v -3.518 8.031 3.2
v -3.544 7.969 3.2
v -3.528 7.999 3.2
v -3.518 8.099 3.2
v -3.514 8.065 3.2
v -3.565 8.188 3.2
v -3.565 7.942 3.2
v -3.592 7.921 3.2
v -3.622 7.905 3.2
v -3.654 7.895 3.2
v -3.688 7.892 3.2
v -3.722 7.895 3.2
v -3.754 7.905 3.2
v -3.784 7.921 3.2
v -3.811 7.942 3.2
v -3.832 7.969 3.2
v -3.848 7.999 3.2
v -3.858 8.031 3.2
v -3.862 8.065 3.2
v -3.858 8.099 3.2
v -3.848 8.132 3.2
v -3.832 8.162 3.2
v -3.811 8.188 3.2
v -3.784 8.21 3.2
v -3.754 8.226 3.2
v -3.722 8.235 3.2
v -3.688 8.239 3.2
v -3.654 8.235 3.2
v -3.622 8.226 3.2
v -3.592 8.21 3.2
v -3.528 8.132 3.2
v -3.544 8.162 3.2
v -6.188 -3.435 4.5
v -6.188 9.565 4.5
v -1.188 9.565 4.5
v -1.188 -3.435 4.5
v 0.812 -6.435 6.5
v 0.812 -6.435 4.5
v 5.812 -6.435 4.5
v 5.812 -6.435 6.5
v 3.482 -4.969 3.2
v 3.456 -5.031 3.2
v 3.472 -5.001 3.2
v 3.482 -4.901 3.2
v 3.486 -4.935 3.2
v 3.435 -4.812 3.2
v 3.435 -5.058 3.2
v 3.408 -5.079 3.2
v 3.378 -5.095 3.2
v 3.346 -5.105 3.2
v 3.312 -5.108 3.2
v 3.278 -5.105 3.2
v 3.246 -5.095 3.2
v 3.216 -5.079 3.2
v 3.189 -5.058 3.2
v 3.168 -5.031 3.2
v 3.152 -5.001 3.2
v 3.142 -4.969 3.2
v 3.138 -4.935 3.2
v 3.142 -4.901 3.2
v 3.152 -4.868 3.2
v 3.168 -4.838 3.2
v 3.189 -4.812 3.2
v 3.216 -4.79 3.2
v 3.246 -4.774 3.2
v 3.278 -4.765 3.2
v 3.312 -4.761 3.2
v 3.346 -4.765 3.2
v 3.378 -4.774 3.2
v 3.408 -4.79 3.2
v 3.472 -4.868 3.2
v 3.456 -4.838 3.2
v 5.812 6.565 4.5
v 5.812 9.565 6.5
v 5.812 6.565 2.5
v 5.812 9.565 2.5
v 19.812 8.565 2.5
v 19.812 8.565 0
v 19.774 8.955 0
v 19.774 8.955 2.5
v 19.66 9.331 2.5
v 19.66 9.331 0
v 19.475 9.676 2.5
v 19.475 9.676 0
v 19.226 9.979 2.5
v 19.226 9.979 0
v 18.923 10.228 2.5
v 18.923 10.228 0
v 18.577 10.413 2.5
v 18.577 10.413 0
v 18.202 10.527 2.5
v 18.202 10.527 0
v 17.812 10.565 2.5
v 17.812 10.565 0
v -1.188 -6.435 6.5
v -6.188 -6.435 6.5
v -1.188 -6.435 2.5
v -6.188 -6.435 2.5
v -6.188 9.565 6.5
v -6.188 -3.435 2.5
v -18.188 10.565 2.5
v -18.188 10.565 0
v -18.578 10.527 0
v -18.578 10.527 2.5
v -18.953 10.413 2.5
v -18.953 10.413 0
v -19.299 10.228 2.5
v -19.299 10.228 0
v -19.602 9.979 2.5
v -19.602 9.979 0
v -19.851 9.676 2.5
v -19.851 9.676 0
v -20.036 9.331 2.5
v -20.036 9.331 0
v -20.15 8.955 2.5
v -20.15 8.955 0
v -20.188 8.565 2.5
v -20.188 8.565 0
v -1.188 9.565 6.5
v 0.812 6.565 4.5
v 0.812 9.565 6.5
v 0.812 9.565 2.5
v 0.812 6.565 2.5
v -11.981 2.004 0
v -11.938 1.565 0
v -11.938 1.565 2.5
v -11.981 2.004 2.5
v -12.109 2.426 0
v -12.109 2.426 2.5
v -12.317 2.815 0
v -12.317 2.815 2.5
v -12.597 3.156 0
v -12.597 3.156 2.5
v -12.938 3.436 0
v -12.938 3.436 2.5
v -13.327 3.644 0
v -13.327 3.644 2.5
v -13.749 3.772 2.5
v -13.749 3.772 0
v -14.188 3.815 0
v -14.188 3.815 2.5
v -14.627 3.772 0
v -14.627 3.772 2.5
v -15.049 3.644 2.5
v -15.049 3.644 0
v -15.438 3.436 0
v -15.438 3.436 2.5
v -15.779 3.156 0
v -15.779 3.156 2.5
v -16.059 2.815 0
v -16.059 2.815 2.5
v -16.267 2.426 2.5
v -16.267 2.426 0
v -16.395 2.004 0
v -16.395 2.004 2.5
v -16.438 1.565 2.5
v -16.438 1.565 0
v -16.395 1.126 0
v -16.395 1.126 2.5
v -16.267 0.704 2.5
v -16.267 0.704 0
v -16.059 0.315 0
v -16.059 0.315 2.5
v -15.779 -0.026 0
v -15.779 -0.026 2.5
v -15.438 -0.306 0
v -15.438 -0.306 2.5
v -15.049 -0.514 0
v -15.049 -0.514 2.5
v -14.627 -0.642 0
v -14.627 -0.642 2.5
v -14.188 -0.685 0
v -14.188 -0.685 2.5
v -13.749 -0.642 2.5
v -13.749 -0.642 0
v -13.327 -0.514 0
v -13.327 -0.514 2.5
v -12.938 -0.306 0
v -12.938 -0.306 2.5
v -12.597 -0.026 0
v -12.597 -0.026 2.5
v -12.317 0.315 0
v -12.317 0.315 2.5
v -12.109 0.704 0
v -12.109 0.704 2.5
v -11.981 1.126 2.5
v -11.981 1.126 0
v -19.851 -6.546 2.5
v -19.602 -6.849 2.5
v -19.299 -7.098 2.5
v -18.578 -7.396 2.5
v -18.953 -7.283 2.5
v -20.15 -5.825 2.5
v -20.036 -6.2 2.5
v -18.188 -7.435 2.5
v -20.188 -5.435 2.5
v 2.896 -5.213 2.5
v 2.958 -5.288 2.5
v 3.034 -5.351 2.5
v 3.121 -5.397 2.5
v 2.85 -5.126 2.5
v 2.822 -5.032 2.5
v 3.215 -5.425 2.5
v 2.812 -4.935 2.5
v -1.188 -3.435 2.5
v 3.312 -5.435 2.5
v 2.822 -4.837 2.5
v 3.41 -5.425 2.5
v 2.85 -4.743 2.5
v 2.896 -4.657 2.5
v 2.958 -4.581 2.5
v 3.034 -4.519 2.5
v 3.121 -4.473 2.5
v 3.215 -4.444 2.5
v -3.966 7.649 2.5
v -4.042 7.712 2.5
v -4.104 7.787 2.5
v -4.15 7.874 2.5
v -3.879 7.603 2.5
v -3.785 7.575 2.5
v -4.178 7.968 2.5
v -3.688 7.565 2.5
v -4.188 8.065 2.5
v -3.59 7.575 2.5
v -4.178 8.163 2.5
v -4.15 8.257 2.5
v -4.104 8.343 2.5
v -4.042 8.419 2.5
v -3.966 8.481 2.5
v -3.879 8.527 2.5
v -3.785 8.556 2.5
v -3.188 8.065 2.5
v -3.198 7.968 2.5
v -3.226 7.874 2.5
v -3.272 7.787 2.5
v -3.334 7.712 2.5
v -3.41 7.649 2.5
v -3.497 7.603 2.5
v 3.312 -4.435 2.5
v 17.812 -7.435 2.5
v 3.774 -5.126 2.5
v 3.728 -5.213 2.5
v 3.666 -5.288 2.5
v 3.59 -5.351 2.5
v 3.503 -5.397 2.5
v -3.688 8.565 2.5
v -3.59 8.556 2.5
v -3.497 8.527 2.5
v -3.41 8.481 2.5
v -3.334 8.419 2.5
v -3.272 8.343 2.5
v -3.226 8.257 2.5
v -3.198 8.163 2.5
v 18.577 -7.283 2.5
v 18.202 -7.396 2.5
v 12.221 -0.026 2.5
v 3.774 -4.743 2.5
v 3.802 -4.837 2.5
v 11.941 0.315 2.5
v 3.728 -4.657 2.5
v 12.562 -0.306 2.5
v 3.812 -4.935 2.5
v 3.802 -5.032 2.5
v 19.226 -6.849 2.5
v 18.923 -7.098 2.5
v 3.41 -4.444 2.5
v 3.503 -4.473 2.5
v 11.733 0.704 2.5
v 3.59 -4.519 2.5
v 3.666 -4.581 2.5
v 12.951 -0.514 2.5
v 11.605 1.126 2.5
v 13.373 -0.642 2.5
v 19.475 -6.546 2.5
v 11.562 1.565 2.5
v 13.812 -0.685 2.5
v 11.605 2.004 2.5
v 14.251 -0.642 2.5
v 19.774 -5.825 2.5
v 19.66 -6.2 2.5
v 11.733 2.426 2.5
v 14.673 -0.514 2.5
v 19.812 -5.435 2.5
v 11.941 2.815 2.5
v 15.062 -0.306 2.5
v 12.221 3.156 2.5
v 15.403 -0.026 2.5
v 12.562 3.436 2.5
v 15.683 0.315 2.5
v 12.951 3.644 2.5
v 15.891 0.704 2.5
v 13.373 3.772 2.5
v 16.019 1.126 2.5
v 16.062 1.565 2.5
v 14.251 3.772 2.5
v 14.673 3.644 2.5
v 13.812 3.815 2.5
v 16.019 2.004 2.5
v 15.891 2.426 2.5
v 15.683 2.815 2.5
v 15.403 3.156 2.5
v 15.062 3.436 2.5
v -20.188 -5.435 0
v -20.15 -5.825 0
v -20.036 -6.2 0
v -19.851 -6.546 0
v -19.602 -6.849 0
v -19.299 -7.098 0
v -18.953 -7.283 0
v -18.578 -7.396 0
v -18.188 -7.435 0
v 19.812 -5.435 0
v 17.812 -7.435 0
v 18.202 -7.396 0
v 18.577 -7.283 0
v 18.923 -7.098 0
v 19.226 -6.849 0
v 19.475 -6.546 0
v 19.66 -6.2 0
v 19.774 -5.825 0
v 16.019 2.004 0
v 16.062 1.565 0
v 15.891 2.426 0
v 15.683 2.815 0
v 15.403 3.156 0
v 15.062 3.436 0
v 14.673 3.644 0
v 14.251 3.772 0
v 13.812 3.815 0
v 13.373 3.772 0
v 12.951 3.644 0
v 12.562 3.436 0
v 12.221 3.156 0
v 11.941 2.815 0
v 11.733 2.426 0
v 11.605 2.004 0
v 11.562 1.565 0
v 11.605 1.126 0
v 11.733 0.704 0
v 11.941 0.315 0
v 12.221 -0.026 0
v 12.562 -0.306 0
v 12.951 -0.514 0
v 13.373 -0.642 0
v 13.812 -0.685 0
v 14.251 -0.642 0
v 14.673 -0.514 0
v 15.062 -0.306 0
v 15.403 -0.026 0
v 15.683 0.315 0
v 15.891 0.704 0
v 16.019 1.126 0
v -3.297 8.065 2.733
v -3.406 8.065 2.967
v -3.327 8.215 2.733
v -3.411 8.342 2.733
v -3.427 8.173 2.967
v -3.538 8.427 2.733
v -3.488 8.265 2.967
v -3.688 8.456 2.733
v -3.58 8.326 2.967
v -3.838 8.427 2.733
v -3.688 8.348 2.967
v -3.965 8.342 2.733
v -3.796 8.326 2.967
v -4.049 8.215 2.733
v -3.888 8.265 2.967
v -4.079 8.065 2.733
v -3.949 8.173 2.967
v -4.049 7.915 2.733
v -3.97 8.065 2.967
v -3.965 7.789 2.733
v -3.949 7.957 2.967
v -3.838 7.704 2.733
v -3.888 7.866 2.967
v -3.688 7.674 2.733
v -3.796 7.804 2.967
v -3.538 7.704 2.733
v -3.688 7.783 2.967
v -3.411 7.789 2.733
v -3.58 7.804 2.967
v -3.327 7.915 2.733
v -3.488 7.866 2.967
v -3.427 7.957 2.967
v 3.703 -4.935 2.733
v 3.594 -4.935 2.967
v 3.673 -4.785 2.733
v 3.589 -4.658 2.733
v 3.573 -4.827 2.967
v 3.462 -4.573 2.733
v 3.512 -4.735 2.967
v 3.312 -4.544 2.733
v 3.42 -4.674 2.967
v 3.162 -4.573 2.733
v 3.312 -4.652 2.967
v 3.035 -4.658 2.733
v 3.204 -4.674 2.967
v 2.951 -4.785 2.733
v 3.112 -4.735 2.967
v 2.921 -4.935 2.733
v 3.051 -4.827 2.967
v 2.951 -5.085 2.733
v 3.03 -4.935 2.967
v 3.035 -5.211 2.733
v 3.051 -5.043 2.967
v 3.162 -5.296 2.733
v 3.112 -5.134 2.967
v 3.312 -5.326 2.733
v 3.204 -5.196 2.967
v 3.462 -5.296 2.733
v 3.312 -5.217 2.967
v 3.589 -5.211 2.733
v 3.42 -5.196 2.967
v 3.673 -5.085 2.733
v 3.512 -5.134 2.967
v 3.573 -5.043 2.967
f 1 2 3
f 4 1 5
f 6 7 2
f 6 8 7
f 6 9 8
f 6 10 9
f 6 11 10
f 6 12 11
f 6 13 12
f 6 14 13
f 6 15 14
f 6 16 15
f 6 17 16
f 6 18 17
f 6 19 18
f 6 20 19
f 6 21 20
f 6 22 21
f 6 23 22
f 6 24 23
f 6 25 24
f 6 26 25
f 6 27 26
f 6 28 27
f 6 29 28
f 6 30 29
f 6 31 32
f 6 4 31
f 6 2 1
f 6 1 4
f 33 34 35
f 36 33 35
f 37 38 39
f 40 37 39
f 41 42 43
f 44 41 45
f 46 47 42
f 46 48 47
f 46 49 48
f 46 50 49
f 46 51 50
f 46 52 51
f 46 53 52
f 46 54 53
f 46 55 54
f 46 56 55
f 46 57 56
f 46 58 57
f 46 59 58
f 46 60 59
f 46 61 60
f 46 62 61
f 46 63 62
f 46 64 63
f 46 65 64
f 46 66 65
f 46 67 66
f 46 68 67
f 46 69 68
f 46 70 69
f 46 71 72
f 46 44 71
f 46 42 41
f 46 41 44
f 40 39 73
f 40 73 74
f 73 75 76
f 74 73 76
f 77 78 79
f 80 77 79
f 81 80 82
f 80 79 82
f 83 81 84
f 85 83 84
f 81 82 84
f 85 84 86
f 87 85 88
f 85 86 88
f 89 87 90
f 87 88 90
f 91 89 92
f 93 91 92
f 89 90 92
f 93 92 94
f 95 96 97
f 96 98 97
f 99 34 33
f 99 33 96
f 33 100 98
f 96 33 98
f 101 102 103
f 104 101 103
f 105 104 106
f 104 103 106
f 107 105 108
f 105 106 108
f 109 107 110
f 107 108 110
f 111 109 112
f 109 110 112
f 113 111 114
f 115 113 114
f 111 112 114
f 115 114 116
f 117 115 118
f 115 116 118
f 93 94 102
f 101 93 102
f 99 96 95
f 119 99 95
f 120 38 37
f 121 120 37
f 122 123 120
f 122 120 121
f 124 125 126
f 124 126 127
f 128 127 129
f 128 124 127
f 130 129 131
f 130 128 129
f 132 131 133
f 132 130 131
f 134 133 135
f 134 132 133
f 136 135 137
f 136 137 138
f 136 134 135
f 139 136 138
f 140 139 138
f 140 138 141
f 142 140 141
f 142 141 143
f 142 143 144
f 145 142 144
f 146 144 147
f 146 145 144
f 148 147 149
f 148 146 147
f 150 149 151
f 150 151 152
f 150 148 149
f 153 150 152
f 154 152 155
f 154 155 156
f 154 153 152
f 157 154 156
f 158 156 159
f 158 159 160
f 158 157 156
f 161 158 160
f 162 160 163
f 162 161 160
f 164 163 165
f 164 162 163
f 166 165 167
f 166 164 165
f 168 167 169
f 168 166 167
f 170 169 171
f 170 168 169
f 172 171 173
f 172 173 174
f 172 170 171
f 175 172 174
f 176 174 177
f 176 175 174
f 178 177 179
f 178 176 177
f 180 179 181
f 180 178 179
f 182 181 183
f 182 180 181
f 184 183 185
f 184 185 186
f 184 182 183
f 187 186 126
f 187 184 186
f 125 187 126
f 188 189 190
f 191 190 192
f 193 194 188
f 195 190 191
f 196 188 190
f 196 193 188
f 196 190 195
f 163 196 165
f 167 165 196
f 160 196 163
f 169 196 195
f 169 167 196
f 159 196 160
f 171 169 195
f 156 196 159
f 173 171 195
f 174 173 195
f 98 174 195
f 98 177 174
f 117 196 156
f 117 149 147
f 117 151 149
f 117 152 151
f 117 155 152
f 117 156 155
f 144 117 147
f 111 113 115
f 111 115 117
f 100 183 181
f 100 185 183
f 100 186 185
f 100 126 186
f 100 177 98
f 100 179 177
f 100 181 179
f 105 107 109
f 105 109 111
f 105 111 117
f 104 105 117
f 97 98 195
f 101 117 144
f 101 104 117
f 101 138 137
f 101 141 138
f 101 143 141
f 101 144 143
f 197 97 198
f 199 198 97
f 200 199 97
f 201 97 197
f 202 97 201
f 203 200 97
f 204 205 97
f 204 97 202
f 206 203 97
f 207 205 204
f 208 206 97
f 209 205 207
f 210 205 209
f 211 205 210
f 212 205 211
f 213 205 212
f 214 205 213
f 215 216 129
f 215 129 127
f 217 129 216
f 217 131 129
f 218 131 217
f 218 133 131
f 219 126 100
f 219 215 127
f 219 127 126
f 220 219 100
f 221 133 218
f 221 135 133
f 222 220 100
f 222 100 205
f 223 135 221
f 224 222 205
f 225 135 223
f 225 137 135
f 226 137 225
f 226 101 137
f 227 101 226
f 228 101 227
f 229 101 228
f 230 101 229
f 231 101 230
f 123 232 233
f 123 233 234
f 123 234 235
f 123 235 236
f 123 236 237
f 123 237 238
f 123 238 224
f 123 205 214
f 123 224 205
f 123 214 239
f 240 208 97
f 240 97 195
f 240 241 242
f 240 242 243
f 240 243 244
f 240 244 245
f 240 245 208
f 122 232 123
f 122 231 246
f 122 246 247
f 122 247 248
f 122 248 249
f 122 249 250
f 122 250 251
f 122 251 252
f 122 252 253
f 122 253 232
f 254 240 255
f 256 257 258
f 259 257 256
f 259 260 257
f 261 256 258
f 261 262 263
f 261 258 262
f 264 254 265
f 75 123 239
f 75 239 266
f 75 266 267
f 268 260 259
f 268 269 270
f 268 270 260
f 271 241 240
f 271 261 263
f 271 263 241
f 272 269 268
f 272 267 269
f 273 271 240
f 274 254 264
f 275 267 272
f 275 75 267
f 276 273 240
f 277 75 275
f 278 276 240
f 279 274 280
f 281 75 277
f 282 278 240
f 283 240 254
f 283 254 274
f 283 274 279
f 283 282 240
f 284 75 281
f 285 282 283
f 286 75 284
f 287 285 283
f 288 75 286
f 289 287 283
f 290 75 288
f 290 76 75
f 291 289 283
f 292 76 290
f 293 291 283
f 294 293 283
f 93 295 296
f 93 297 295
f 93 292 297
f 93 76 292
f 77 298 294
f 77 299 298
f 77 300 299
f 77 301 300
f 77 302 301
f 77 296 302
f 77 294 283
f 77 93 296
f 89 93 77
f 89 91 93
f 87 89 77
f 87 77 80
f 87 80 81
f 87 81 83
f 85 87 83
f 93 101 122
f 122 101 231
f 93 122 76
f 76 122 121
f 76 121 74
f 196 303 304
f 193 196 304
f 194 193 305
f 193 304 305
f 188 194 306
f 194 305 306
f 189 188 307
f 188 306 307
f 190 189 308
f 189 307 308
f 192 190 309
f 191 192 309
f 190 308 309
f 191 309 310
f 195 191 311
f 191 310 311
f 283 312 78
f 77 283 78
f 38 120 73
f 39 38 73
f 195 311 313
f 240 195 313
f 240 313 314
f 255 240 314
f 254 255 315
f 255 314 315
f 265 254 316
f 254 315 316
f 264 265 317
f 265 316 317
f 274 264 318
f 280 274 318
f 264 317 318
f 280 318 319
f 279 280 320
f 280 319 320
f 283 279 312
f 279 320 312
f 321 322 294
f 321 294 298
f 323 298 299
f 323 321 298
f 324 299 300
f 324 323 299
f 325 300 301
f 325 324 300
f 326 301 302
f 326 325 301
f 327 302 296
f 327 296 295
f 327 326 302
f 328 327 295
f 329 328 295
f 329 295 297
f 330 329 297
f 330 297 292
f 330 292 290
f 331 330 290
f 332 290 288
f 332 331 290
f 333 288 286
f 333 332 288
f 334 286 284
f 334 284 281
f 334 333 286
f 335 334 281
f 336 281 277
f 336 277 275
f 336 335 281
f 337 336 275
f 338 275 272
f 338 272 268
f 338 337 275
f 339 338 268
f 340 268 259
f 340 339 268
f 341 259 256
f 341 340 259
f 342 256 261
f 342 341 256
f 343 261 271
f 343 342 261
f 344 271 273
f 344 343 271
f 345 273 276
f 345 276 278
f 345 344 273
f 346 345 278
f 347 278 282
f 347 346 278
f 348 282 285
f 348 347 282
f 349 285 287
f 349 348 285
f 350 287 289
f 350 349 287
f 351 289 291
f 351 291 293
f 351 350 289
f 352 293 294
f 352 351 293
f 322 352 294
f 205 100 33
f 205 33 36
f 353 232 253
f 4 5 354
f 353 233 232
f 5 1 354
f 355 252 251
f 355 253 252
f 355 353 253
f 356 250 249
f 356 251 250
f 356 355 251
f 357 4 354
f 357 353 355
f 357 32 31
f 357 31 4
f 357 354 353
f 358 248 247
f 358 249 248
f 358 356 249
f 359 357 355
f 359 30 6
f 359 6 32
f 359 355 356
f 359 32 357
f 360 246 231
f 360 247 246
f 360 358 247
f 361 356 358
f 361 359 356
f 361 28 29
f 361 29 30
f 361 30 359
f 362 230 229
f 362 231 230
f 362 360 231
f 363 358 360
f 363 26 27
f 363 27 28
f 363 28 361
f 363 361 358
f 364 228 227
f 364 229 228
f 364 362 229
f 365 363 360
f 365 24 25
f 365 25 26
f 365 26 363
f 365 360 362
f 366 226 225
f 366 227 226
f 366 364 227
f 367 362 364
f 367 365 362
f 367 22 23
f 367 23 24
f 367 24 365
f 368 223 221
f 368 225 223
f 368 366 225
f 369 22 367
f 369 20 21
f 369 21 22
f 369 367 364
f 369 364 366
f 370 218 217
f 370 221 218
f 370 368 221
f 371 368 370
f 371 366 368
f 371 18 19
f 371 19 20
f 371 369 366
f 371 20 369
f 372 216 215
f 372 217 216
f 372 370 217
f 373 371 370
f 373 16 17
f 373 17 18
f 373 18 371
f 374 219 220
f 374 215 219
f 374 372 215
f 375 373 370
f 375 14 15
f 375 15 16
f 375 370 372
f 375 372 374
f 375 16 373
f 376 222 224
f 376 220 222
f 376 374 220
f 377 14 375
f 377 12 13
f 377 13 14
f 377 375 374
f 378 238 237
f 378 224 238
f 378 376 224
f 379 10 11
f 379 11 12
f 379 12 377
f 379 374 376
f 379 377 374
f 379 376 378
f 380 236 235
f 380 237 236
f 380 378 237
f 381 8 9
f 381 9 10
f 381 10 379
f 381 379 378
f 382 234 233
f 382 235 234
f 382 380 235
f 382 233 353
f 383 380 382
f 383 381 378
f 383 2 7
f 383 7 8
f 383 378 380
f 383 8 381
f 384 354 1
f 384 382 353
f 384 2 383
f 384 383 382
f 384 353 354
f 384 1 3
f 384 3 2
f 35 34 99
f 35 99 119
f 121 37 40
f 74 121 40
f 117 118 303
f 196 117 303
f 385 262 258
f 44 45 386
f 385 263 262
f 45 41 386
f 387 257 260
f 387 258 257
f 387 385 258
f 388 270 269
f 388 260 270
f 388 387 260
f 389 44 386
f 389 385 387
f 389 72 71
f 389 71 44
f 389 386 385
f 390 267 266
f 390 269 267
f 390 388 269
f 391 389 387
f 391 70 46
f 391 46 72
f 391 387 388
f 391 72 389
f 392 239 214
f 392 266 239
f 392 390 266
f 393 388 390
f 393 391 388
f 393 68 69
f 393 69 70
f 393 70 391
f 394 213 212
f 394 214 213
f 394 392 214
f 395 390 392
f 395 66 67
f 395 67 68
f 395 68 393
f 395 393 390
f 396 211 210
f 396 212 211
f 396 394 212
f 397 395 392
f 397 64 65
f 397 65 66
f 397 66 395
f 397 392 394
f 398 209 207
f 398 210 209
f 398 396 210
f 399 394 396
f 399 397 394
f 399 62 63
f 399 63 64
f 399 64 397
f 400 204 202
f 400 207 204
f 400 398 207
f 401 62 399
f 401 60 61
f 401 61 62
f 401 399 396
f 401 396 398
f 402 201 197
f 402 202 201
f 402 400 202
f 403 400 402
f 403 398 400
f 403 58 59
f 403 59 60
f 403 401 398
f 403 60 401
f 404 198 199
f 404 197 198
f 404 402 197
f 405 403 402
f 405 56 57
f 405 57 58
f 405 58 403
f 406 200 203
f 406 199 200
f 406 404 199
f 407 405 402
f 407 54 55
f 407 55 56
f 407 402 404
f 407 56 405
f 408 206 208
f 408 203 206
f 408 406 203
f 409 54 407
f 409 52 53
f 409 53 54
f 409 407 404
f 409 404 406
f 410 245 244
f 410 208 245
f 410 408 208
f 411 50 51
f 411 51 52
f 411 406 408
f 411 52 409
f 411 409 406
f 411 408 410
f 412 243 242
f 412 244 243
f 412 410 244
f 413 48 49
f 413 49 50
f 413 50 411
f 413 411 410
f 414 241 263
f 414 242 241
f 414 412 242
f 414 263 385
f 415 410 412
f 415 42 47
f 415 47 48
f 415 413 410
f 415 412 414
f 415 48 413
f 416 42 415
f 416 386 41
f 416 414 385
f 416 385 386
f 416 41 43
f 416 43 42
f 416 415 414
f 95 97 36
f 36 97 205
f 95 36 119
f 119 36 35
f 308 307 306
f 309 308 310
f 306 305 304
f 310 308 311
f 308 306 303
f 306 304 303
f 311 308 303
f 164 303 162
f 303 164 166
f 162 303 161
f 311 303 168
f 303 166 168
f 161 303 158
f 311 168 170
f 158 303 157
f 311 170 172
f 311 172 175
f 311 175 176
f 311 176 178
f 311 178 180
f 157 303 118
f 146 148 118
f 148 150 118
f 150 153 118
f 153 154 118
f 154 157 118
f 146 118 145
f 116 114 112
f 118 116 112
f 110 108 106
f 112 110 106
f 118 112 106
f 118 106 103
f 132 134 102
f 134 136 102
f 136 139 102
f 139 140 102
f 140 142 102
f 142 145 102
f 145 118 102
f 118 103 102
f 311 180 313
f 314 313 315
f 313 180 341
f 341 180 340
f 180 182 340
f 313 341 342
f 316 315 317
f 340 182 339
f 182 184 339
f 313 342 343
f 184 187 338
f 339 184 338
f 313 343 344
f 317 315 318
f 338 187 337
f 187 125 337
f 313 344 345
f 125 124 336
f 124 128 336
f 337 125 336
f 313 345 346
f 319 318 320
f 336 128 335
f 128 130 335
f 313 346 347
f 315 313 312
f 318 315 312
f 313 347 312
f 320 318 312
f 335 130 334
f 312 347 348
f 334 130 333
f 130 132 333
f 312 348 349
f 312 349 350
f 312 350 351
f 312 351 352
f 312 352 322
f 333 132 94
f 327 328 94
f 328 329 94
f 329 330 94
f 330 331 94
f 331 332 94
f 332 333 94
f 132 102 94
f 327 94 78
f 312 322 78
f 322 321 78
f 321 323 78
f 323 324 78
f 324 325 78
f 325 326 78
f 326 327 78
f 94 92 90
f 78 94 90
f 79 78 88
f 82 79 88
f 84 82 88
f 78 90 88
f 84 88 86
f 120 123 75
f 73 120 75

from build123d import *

# Parameters (mm, degrees)
F0_R     = 2.25
F1_DEPTH = 2.5
F2_W     = 5
F2_H     = 3
F3_DEPTH = 2
F4_W     = 5
F4_H     = 13
F4_H_2   = 16
F4_H_3   = 3
F5_DEPTH = 2
F2_R     = 0.5
F6_DEPTH = 0.7
F6_TAPER = 25


with BuildPart() as f1:
    # F0 (on Top) → F1 (new body)
    with BuildSketch(Plane.XY):
        with BuildLine():
            Line((17.8120516539, 10.5652021154), (-18.1879483461, 10.5652021154))
            ThreePointArc((-18.1879483461, 10.5652021154), (-19.6021619085, 9.9794156778), (-20.1879483461, 8.5652021154))
            Line((-20.1879483461, 8.5652021154), (-20.1879483461, -5.4347978846))
            ThreePointArc((-20.1879483461, -5.4347978846), (-19.6021619085, -6.849011447), (-18.1879483461, -7.4347978846))
            Line((-18.1879483461, -7.4347978846), (17.8120516539, -7.4347978846))
            ThreePointArc((17.8120516539, -7.4347978846), (19.2262652162, -6.849011447), (19.8120516539, -5.4347978846))
            Line((19.8120516539, -5.4347978846), (19.8120516539, 8.5652021154))
            ThreePointArc((19.8120516539, 8.5652021154), (19.2262652162, 9.9794156778), (17.8120516539, 10.5652021154))
        make_face()
        with Locations((-14.1879483461, 1.5652021154)):
            Circle(F0_R, mode=Mode.SUBTRACT)
        with Locations((13.8120516539, 1.5652021154)):
            Circle(F0_R, mode=Mode.SUBTRACT)
    extrude(amount=F1_DEPTH)

    # F2 (on face) → F3 (join)
    with BuildSketch(Plane.XY.offset(2.5)):
        with Locations((-3.6879483461, -4.9347978846)):
            Rectangle(F2_W, F2_H)
        with Locations((3.3120516539, 8.0652021154)):
            Rectangle(F2_W, F2_H)
    extrude(amount=F3_DEPTH)

    # F4 (on face) → F5 (join)
    with BuildSketch(Plane.XY.offset(4.5)):
        with Locations((-3.6879483461, 3.0652021154)):
            Rectangle(F4_W, F4_H)
        with Locations((3.3120516539, 1.5652021154)):
            Rectangle(F4_W, F4_H_2)
        with Locations((-3.6879483461, -4.9347978846)):
            Rectangle(F4_W, F4_H_3)
    extrude(amount=F5_DEPTH)

    # F2 (on face) → F6 (join)
    with BuildSketch(Plane.XY.offset(2.5)):
        with Locations((-3.6879483461, 8.0652021154)):
            Circle(F2_R)
        with Locations((3.3120516539, -4.9347978846)):
            Circle(F2_R)
    extrude(amount=F6_DEPTH, taper=F6_TAPER)


solid = f1.part
